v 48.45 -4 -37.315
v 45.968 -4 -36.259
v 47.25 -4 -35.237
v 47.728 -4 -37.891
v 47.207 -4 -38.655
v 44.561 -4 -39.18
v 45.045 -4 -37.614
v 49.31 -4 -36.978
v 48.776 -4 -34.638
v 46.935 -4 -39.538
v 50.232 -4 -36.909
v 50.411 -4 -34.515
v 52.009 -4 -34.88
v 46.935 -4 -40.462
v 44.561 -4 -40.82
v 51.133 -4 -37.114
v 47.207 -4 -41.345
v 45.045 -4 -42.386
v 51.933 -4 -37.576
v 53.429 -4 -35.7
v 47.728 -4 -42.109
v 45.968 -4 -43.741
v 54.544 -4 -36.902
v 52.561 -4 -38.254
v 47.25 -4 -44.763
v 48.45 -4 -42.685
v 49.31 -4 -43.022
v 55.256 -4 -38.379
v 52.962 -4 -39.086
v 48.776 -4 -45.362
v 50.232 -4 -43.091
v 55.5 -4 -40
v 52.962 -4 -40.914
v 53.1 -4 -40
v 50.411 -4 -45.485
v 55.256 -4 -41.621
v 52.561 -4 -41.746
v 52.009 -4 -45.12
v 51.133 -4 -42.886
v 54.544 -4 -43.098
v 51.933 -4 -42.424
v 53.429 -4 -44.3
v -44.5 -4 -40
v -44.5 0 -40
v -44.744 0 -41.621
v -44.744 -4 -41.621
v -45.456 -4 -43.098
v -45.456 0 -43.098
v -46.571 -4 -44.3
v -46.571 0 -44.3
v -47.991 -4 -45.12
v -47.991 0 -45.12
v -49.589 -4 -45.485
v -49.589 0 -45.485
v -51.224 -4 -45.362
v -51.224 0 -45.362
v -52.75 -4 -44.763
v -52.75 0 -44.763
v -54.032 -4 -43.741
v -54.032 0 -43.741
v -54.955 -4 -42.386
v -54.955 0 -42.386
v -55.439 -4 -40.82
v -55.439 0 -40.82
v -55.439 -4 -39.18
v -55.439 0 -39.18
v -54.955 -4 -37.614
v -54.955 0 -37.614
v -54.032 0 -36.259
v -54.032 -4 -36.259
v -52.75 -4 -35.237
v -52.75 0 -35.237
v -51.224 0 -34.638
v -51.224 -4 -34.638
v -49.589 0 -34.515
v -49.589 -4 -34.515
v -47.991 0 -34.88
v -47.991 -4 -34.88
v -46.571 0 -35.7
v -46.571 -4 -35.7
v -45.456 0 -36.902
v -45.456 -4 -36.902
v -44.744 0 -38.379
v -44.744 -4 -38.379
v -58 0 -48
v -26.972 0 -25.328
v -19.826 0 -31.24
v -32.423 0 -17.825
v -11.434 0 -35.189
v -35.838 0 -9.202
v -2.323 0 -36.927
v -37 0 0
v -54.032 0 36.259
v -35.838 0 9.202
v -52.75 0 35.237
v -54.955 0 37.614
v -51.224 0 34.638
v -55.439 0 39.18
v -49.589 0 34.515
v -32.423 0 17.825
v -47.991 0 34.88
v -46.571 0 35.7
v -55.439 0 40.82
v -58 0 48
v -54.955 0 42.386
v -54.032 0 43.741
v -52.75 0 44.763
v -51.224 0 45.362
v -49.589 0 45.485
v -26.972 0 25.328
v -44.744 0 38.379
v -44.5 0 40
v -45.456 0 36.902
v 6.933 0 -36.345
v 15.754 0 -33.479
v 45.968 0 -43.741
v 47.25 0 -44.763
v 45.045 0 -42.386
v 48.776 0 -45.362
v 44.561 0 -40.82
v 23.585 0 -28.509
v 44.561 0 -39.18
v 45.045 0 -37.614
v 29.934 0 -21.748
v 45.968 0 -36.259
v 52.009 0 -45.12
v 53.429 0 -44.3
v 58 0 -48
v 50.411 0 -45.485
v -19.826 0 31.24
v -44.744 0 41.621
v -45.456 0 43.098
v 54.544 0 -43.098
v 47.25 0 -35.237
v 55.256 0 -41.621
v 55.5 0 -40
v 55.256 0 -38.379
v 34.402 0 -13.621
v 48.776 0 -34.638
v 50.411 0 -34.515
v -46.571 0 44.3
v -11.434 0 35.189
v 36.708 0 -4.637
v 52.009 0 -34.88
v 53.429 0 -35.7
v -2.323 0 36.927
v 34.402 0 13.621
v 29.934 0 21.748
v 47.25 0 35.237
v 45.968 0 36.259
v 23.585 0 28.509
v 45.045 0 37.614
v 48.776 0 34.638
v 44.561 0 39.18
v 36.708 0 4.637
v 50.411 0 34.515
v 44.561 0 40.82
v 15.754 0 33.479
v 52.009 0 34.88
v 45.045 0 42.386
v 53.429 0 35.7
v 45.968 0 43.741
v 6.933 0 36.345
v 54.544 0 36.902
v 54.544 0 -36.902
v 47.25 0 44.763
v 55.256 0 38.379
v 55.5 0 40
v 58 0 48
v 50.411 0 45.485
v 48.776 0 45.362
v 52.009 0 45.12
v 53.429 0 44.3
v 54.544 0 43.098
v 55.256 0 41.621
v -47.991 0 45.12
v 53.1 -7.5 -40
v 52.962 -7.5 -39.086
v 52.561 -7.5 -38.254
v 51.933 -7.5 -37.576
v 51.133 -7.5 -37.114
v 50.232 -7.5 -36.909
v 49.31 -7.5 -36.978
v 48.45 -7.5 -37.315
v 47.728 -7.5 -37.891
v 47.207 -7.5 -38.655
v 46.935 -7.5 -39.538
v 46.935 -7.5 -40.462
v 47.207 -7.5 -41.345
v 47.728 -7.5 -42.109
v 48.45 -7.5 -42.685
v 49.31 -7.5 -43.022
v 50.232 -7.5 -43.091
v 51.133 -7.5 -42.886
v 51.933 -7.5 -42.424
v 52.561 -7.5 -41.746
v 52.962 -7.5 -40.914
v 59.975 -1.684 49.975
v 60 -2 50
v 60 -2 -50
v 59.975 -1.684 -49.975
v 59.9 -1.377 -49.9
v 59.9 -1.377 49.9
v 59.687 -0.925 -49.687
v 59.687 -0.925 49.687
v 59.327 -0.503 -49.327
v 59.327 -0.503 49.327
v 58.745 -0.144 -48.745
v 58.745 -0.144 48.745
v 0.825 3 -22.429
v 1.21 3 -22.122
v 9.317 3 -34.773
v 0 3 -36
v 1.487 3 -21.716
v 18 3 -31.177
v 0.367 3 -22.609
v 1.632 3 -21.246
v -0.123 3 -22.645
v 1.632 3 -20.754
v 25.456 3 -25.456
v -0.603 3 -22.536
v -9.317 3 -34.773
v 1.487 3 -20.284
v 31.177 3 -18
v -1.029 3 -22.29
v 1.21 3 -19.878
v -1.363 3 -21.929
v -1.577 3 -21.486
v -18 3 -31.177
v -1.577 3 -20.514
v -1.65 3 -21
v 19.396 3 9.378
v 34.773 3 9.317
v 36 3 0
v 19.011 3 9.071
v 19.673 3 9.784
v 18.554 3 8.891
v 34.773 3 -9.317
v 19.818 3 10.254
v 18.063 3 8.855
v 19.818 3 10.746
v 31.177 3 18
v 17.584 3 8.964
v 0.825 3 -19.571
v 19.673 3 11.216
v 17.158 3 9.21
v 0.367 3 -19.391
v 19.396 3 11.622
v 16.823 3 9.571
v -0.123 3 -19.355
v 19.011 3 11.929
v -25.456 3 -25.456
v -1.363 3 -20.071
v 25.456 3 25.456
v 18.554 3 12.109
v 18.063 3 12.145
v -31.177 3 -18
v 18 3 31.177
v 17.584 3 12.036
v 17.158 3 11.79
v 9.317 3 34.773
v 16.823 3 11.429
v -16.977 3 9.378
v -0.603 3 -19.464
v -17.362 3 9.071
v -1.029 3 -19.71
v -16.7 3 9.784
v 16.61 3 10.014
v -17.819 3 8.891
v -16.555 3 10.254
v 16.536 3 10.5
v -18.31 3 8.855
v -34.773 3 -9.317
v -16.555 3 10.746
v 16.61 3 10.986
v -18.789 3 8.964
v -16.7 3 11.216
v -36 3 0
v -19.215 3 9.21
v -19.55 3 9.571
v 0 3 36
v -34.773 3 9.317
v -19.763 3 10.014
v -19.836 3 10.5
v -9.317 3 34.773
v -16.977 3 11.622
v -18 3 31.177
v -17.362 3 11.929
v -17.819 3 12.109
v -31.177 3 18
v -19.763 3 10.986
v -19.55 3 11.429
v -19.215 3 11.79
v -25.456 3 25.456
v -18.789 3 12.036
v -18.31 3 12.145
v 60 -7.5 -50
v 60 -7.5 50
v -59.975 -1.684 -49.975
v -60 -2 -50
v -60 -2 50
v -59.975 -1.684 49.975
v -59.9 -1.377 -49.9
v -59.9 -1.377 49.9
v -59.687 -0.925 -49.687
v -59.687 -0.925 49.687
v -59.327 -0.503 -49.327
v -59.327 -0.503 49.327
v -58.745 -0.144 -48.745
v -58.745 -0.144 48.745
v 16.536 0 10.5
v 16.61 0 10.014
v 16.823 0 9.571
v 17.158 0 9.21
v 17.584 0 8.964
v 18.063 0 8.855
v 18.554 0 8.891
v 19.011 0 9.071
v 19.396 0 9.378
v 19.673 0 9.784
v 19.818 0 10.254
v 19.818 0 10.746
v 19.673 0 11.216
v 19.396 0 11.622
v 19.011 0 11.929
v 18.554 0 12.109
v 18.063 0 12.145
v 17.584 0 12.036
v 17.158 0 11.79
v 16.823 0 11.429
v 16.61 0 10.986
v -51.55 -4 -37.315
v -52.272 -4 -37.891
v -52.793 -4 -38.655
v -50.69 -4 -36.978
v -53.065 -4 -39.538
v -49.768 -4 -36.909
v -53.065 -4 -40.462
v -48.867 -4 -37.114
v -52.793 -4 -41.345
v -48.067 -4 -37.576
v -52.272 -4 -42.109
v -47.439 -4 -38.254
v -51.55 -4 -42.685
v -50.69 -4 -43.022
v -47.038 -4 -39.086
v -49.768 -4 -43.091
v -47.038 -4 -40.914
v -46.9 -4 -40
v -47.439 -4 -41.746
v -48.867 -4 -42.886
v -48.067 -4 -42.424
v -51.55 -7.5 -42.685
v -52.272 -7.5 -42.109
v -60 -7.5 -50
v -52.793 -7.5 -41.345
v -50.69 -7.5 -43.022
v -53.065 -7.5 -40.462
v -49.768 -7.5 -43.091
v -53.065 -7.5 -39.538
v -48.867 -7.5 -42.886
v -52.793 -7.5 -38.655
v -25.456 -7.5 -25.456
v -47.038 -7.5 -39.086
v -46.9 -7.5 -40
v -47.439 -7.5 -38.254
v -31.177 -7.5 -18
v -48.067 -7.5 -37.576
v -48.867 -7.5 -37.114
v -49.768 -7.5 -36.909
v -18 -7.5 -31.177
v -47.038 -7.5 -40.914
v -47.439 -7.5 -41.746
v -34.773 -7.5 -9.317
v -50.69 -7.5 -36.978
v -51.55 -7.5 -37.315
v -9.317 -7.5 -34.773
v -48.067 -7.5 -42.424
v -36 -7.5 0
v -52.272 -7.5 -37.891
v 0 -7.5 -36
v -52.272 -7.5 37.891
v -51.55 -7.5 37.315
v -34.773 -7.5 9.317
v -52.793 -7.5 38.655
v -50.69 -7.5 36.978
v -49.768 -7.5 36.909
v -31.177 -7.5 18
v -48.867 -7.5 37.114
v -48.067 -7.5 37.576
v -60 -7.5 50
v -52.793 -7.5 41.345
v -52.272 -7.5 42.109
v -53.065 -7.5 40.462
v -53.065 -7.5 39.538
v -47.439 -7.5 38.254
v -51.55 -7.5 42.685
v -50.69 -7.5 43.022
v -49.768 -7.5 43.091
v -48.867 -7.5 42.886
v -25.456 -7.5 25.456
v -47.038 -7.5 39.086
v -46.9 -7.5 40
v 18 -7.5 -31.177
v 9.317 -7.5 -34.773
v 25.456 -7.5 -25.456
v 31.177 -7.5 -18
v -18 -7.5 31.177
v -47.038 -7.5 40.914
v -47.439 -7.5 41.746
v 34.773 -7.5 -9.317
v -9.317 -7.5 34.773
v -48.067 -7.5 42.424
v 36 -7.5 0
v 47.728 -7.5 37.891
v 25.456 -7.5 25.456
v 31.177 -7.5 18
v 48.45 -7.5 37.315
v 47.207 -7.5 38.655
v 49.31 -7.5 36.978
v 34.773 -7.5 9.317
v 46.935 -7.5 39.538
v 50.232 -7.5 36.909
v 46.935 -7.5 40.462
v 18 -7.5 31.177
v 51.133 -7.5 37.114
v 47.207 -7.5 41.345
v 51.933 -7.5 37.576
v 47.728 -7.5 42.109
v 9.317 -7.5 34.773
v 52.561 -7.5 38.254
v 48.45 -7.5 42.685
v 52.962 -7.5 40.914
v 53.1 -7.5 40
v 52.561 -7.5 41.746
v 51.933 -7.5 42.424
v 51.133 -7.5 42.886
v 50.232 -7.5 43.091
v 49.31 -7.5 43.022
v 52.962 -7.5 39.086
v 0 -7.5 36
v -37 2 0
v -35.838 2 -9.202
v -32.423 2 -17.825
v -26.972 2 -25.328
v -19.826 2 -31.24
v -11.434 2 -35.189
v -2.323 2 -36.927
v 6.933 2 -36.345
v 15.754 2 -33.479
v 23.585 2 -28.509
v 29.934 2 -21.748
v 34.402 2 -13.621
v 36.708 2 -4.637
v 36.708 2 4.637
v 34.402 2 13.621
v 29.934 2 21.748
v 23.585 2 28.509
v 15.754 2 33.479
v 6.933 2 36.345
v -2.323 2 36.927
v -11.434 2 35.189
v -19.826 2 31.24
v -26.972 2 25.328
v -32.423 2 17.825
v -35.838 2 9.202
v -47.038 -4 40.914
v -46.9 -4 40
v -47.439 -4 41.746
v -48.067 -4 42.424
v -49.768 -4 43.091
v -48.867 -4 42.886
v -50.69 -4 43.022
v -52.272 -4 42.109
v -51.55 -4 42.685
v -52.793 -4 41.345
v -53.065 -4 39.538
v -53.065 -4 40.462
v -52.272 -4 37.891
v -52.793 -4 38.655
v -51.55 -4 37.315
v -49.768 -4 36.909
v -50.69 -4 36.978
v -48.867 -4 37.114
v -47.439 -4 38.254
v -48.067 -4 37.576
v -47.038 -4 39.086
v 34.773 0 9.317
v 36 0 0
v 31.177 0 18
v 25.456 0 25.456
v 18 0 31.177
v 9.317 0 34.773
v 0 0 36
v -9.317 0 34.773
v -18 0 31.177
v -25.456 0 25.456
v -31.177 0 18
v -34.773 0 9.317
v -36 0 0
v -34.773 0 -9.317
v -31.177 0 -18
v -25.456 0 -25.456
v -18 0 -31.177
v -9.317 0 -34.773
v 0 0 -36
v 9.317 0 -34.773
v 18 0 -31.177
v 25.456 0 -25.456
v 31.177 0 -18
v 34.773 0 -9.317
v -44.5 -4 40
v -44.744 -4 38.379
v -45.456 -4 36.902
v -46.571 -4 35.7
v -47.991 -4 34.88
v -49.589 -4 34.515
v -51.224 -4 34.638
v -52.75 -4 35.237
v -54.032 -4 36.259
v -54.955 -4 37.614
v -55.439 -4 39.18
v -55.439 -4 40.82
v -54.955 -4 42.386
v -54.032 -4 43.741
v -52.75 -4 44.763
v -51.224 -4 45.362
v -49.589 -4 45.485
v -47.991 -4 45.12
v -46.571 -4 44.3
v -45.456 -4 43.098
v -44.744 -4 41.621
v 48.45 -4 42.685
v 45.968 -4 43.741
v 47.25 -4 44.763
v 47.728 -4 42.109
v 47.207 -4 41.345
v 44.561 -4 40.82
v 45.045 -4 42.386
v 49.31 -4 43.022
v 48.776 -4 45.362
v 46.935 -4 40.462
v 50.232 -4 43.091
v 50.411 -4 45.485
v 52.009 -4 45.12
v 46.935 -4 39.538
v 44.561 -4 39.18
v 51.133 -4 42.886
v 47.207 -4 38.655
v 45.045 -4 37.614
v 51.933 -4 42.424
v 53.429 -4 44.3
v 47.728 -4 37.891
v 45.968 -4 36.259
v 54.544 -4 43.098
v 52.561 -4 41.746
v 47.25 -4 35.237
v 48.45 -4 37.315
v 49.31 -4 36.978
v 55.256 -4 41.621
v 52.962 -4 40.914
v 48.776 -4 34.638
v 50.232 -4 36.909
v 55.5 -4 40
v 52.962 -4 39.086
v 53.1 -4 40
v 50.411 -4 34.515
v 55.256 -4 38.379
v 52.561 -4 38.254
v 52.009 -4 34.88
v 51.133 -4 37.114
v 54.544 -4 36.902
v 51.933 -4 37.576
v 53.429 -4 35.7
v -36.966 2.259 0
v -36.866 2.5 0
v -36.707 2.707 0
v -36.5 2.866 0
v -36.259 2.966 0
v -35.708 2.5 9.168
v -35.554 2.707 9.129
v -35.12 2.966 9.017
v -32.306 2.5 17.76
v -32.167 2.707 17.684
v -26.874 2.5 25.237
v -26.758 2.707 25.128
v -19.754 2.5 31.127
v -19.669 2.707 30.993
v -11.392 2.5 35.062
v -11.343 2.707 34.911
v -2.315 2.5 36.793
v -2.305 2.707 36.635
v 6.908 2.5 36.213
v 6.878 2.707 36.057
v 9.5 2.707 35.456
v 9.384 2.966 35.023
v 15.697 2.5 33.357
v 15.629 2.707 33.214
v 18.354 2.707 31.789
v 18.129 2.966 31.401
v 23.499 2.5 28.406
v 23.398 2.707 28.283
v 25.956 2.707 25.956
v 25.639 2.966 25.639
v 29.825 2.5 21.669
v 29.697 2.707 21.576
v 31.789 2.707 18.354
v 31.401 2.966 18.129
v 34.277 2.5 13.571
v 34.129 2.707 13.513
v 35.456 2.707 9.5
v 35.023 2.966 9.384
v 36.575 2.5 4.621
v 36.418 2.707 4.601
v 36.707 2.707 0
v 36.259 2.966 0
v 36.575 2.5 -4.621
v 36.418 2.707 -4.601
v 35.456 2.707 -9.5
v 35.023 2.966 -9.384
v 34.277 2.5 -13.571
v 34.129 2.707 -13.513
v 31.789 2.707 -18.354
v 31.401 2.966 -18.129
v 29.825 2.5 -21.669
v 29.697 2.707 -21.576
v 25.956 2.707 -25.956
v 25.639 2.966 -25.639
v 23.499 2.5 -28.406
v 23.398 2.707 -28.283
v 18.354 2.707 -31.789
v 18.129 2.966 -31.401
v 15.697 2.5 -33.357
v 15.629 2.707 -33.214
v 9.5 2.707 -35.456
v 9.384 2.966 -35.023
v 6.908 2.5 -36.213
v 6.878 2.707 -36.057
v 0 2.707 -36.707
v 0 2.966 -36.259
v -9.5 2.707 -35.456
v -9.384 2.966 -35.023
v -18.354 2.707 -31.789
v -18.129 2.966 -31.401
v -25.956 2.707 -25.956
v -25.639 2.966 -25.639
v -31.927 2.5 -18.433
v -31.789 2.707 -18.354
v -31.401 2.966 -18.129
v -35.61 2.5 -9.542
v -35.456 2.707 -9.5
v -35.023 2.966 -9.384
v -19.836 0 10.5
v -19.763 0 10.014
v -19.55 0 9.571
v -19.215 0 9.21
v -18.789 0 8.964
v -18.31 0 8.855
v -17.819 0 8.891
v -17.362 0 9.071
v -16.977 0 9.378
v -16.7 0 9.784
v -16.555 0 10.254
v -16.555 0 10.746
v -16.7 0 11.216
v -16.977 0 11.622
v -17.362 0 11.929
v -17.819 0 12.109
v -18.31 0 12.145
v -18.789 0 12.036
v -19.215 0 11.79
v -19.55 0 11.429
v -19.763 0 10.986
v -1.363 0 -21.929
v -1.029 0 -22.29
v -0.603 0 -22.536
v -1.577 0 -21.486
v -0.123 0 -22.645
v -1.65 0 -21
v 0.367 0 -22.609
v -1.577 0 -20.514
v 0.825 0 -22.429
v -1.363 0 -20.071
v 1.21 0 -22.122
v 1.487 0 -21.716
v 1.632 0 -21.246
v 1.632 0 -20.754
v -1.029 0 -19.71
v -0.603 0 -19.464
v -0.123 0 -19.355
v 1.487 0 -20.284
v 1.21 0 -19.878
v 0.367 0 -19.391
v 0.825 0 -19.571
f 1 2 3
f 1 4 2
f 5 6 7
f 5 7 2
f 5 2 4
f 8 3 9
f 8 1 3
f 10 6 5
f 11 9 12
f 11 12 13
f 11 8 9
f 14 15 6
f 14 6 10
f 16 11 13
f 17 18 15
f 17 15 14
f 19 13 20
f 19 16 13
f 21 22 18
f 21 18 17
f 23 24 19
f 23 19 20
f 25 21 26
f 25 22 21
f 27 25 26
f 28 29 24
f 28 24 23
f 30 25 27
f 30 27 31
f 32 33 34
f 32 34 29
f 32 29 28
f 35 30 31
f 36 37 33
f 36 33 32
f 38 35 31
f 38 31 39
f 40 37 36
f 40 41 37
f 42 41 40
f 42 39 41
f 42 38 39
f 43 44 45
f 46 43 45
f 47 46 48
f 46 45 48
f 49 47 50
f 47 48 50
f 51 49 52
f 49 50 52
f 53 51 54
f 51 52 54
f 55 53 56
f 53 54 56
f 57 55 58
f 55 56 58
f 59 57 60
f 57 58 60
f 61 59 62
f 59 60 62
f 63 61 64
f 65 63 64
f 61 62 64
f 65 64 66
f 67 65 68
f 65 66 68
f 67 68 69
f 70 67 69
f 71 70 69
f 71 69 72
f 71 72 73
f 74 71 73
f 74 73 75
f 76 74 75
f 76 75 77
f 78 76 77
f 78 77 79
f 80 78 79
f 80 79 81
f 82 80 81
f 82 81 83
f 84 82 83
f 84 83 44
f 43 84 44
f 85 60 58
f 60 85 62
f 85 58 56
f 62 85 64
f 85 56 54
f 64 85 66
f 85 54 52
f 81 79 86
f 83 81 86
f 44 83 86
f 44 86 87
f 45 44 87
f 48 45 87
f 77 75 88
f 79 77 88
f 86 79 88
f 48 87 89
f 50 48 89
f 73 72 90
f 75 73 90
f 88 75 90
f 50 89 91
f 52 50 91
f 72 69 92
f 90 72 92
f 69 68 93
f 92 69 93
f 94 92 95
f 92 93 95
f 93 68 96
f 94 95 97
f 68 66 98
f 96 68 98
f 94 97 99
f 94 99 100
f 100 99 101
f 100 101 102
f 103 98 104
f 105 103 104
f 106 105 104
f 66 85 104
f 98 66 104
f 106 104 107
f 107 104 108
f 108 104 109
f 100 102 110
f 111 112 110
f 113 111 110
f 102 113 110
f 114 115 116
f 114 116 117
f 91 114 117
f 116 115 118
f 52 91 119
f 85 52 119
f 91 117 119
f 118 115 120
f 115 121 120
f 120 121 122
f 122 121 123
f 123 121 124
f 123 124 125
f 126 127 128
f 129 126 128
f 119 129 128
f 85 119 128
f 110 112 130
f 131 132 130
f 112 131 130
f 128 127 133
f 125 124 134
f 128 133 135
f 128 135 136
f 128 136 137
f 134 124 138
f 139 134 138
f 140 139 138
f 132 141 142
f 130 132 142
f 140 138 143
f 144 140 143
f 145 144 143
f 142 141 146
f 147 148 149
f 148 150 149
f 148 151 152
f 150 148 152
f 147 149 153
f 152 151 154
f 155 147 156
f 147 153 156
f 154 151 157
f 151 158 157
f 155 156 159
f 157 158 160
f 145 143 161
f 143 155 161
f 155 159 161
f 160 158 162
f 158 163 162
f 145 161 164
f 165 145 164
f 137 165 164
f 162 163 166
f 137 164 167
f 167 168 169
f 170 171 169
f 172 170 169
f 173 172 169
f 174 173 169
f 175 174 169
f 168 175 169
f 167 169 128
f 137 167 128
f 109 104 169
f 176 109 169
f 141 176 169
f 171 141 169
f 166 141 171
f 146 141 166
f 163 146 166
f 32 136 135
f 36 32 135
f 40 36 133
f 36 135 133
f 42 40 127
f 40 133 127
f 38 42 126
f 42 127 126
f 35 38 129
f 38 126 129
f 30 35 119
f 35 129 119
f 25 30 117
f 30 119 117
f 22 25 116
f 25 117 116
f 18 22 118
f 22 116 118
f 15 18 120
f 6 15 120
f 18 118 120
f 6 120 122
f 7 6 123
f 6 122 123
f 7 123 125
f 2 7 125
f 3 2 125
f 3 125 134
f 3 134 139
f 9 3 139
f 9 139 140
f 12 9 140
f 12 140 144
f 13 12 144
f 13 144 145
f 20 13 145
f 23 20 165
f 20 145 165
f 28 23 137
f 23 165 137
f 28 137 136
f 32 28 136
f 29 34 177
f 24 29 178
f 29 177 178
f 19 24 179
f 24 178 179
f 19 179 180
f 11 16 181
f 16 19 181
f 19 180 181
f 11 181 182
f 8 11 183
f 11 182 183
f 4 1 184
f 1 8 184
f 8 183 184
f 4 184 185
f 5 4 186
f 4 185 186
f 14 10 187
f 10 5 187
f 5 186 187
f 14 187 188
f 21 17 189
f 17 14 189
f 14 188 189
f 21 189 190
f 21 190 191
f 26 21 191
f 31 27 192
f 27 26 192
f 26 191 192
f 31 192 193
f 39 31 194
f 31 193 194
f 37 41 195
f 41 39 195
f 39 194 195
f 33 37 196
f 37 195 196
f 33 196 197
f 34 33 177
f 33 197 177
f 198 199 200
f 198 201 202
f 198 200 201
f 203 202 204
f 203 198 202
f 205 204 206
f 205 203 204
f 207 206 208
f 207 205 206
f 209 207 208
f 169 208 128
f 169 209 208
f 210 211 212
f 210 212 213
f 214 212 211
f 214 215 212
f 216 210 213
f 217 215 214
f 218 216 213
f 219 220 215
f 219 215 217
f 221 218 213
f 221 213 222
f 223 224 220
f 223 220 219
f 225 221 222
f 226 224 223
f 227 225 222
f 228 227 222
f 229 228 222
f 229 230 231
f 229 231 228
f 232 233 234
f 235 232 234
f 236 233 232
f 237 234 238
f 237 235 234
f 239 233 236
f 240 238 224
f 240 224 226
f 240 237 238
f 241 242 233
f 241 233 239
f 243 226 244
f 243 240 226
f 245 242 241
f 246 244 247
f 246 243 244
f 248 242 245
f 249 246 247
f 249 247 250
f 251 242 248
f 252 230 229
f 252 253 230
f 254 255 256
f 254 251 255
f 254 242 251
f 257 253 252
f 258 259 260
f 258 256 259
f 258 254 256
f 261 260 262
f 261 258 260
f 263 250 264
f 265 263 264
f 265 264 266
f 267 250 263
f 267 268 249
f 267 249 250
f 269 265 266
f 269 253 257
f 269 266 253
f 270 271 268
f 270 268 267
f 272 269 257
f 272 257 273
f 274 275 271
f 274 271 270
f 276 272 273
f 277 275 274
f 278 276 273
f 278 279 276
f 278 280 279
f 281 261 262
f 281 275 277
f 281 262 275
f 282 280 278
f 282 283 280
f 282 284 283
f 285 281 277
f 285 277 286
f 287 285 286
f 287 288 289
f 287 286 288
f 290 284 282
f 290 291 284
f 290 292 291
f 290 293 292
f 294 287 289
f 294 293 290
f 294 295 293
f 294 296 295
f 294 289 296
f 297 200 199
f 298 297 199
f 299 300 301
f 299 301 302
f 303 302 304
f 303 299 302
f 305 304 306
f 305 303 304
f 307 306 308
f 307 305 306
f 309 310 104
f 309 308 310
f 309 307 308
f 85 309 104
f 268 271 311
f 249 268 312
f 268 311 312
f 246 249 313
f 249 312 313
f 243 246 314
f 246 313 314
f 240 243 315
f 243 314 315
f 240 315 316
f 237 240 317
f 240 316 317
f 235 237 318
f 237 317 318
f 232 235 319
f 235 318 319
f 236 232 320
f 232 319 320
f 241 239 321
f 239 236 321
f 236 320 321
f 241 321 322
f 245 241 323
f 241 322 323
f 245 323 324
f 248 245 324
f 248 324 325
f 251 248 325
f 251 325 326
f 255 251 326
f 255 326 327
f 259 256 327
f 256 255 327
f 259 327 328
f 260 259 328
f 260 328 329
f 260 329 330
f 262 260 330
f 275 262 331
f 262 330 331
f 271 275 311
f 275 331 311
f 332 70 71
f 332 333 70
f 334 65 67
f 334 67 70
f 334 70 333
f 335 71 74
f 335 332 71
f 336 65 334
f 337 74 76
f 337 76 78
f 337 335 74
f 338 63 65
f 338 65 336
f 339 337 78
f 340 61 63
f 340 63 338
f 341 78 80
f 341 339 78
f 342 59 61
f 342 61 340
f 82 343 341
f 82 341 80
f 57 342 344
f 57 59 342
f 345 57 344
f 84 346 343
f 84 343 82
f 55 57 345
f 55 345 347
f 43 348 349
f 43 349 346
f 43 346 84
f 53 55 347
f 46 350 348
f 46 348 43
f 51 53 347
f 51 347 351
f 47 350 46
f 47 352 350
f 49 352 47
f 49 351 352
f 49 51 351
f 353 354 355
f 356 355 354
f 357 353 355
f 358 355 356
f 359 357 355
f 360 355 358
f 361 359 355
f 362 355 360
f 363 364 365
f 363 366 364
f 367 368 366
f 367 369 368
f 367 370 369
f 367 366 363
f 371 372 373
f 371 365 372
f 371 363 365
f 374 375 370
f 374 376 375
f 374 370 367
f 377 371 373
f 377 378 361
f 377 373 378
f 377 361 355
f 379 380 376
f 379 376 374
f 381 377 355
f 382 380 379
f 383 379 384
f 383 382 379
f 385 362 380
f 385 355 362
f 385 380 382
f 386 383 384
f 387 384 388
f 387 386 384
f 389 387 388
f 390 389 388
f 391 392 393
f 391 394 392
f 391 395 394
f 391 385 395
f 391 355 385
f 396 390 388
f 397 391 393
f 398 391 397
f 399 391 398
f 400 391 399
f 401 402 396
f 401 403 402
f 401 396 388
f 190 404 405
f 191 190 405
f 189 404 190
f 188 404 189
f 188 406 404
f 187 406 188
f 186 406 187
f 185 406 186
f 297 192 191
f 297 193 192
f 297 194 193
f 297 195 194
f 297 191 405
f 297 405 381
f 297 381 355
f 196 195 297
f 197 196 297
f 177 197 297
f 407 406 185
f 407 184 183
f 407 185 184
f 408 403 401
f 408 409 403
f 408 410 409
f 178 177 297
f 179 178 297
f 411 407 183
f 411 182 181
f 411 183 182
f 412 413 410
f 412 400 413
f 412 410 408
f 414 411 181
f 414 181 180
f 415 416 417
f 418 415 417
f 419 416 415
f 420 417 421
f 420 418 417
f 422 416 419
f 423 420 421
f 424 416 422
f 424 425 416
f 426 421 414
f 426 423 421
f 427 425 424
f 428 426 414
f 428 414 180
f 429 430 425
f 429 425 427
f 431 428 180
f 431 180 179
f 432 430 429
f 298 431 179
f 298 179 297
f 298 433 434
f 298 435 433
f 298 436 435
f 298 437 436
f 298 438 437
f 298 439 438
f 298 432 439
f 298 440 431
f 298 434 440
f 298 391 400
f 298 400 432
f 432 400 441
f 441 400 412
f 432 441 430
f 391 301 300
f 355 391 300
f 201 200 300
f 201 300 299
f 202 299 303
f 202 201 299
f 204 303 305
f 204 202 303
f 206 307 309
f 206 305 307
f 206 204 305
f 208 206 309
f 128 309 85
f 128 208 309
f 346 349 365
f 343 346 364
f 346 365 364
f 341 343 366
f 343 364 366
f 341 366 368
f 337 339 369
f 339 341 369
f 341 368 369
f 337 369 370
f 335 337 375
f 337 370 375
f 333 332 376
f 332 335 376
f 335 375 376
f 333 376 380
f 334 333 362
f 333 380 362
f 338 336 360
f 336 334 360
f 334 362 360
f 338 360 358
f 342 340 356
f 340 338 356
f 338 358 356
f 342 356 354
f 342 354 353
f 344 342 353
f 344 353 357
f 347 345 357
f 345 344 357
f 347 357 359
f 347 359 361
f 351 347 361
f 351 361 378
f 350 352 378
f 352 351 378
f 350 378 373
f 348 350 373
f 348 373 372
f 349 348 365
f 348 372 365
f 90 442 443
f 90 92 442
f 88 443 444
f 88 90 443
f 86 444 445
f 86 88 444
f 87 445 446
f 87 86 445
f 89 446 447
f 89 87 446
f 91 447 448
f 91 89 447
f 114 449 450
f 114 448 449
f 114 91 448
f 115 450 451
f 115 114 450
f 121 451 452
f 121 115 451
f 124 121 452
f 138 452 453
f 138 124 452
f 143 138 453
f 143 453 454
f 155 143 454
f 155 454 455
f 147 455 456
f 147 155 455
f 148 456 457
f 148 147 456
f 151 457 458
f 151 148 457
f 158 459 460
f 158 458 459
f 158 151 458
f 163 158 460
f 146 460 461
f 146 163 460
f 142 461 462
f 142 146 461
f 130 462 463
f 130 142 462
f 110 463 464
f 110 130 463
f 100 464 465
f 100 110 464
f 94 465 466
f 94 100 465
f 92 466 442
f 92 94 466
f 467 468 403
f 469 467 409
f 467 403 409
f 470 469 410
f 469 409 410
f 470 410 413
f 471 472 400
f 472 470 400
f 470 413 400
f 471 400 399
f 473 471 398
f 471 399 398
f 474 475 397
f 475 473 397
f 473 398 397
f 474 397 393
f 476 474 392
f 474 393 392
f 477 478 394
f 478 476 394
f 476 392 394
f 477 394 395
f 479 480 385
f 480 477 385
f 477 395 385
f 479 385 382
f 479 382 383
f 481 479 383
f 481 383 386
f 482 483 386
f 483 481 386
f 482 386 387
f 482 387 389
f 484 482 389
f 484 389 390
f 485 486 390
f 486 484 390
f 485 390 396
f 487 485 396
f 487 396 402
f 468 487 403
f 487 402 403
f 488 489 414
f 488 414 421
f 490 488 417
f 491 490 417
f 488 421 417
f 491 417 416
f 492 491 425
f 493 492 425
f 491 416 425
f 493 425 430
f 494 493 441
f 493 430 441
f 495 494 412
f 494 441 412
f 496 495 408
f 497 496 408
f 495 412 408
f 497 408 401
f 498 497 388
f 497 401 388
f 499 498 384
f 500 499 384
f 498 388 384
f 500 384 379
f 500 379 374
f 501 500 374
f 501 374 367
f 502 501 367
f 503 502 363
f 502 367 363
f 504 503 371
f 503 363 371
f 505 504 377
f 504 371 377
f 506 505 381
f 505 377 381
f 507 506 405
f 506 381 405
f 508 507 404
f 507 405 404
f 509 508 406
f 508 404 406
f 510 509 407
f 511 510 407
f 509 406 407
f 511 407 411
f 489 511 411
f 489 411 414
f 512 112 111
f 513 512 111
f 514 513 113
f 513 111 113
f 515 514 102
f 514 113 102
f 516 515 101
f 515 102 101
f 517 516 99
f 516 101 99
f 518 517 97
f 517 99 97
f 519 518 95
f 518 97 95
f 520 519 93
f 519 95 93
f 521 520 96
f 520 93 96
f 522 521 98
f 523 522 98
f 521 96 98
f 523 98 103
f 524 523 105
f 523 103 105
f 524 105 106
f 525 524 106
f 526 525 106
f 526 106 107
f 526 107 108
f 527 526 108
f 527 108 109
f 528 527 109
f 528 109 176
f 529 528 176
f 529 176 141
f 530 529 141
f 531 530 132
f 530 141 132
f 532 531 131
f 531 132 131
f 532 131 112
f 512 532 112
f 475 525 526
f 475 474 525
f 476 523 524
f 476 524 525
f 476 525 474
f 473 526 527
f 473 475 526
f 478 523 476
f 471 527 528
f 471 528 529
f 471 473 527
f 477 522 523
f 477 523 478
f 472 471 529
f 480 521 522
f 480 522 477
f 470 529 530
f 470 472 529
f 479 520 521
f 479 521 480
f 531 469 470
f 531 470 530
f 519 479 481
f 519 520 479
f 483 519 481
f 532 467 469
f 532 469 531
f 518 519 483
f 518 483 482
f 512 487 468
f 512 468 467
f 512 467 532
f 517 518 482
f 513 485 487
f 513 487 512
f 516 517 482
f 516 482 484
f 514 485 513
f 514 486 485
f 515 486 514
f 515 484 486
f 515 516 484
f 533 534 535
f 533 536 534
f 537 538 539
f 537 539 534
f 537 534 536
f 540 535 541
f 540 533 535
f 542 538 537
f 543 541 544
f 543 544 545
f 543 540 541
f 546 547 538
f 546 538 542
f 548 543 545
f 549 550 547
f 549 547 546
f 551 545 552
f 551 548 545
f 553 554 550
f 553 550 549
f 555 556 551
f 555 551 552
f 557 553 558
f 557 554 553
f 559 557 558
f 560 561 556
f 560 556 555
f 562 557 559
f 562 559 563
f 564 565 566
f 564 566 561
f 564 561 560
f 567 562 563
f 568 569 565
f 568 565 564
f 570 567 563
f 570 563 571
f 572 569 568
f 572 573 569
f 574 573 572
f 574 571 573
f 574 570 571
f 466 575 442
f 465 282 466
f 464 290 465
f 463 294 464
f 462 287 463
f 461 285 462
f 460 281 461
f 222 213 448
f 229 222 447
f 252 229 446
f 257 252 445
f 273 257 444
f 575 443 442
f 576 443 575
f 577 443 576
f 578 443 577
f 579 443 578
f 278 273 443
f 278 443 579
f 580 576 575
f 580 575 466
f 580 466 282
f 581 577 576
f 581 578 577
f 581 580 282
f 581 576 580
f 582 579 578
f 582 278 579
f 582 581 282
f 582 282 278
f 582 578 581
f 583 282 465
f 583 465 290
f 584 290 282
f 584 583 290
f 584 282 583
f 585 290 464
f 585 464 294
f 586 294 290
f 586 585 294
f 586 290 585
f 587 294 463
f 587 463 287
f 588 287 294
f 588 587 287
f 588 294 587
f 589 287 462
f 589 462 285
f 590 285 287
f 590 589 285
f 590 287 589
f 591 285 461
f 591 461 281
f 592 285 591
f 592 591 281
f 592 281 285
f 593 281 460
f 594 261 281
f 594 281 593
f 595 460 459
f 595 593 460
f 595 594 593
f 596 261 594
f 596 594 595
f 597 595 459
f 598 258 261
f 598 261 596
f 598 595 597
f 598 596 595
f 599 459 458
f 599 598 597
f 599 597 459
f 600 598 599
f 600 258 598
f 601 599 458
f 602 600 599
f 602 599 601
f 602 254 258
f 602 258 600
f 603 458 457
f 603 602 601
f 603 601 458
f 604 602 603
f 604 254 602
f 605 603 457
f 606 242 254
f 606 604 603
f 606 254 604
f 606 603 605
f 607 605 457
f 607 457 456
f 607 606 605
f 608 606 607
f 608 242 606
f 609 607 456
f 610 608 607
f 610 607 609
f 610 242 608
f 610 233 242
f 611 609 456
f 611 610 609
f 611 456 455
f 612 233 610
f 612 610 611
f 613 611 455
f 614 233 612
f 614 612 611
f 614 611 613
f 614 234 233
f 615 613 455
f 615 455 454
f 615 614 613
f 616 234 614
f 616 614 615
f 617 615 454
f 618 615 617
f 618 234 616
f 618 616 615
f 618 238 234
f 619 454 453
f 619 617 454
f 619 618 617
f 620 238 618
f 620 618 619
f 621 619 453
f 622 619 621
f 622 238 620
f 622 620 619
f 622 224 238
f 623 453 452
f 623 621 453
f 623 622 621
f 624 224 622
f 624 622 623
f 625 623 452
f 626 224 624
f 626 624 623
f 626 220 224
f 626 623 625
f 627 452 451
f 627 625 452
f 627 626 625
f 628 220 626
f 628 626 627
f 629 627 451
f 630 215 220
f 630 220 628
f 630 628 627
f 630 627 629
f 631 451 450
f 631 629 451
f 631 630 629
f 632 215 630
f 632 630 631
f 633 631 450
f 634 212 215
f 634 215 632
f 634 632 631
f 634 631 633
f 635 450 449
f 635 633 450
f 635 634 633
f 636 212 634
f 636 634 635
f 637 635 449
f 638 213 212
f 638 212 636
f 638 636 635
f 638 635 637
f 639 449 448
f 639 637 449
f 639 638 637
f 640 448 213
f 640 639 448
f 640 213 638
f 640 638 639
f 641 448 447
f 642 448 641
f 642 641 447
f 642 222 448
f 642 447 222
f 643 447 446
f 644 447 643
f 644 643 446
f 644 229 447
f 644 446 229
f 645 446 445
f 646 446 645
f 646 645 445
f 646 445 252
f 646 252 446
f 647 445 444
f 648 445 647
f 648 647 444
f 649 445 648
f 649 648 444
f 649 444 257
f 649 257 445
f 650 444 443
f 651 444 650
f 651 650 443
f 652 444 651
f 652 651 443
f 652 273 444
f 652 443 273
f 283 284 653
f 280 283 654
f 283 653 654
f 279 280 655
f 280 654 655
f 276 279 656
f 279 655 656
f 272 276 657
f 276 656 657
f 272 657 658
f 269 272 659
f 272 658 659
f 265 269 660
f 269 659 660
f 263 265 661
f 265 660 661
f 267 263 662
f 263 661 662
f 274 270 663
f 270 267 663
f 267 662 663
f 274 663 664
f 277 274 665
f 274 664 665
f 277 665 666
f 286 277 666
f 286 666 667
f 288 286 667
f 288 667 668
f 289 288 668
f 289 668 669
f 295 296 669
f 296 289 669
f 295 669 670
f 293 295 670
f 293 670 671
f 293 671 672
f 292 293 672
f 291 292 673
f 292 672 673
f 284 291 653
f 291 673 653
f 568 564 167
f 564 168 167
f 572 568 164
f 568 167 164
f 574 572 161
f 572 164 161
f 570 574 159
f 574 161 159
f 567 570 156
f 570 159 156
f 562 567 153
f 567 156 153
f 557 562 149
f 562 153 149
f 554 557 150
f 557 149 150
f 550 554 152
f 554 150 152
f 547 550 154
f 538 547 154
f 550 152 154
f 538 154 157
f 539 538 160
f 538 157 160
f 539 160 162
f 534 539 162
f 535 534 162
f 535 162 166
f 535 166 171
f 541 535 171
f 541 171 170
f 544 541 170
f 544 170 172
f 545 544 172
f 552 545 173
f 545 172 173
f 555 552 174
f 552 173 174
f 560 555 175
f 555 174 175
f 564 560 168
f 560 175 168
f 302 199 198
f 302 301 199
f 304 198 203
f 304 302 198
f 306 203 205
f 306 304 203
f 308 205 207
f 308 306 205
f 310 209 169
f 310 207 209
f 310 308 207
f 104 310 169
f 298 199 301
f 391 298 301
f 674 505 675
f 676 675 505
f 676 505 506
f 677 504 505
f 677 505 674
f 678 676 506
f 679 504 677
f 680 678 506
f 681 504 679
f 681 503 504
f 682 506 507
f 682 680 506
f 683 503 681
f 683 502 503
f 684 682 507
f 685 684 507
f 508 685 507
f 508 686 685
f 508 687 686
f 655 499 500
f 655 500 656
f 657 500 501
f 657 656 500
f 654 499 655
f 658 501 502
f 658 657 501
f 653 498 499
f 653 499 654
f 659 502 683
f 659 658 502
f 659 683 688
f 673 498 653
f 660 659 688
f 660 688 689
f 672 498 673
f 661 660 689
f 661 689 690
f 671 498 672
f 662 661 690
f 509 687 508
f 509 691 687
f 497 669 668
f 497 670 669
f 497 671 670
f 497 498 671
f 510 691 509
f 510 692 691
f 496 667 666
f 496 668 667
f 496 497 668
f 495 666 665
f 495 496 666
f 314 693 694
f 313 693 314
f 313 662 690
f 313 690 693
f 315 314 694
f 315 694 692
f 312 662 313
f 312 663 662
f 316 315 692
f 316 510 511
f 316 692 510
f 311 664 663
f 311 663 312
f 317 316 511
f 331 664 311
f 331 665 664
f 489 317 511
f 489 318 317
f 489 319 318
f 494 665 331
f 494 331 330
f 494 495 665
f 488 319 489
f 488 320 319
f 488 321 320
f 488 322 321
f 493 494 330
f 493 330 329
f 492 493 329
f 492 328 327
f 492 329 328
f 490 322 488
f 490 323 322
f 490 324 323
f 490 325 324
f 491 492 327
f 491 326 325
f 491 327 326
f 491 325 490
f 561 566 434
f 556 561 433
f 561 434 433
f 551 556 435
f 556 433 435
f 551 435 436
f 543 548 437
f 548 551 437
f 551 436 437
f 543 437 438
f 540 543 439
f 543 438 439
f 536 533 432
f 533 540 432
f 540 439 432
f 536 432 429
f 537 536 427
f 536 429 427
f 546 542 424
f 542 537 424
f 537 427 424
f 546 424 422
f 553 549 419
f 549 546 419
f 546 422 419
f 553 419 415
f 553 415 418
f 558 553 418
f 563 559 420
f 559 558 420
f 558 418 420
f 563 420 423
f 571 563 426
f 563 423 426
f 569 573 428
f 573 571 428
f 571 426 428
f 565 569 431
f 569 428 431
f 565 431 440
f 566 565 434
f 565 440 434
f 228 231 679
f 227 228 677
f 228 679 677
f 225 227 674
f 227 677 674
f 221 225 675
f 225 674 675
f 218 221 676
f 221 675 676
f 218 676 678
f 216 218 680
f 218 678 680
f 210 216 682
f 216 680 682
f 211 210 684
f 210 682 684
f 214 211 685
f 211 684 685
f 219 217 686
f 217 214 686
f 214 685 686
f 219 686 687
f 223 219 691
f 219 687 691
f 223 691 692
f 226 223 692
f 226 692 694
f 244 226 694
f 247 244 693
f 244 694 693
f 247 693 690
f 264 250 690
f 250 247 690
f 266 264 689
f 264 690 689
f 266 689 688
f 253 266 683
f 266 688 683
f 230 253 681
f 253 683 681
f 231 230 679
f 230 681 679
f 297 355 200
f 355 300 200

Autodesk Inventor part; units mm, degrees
ref_plane "YZ Plane" through (0, 0, 0) normal (1, 0, 0) x (0, 1, 0)
ref_plane "XZ Plane" through (0, 0, 0) normal (0, 1, 0) x (-1, 0, 0)
ref_plane "XY Plane" through (0, 0, 0) normal (0, 0, 1) x (1, 0, 0)
sketch "스케치1" plane through (0, 0, 0) normal (0, 1, 0) x (-1, 0, 0)
  circle A0 centre (0, 0) radius 37
  circle A1 centre (0, 0) radius 21 construction
  circle A2 centre (0, -21) radius 1.65
  circle A3 centre (18.1865, 10.5) radius 1.65
  circle A4 centre (-18.1865, 10.5) radius 1.65
  dimension "d1" = 42
  dimension "d0" = 74
  dimension "d2" = 3.3
  dimension "d6" = 360
extrude "돌출1" add sketch "스케치1" along normal blind 3
sketch "스케치2" plane through (0, 0, 0) normal (0, -1, 0) x (1, 0, 0)
  line L0 (60, 50) -> (-60, 50)
  line L1 (-60, 50) -> (-60, -50)
  line L2 (-60, -50) -> (60, -50)
  line L3 (60, -50) -> (60, 50)
  line L4 (60, 50) -> (-60, -50) construction
  line L5 (-60, 50) -> (60, -50) construction
  circle A0 centre (0, 0) radius 37 projected
  circle A1 centre (18.1865, 10.5) radius 1.65 projected
  circle A2 centre (-18.1865, 10.5) radius 1.65 projected
  circle A3 centre (0, -21) radius 1.65 projected
  dimension "d10" = 120
  dimension "d11" = 100
extrude "돌출2" add sketch "스케치2" along normal blind 7.5 contours L3 L2 L1 L0 | A0
fillet "모깎기1" radius 2 4 edges at (60, 0, 0) (0, 0, -50) (-60, 0, 0) (0, 0, 50)
fillet "모깎기1" radius 1 1 edges at (37, 3, 0)
sketch "스케치5" plane through (0, -7.5, 0) normal (0, -1, 0) x (1, 0, 0)
  circle A0 centre (0, 0) radius 36 projected
extrude "돌출3" cut sketch "스케치5" against normal blind 7.5
sketch "스케치6" plane through (0, -7.5, 0) normal (0, -1, 0) x (1, 0, 0)
  circle A0 centre (-50, -40) radius 3.1
  line L0 (-60, -50) -> (60, -50) projected
  line L1 (-60, 50) -> (-60, -50) projected
  circle A1 centre (50, -40) radius 3.1
  circle A2 centre (-50, 40) radius 3.1
  circle A3 centre (50, 40) radius 3.1
  point P0 (0, 0)
  dimension "d18" = 6.2
  dimension "d19" = 10
  dimension "d20" = 10
  dimension "d21" = 120
  dimension "d22" = 100
  dimension "d25" = 100
  dimension "d32" = 80
extrude "돌출4" cut sketch "스케치6" against normal through all
sketch "스케치7" plane through (0, 0, 0) normal (0, 1, 0) x (1, 0, 0)
  circle A0 centre (-50, 40) radius 3.1 projected
  circle A1 centre (50, 40) radius 3.1 projected
  circle A2 centre (-50, -40) radius 3.1 projected
  circle A3 centre (50, -40) radius 3.1 projected
  circle A4 centre (0, 0) radius 37 projected
  line L0 (-58, -48) -> (-58, 48) projected
  line L1 (58, -48) -> (-58, -48) projected
  line L2 (58, 48) -> (58, -48) projected
  line L3 (-58, 48) -> (58, 48) projected
  circle A5 centre (50, -40) radius 5.5
  circle A6 centre (-50, -40) radius 5.5
  circle A7 centre (-50, 40) radius 5.5
  circle A8 centre (50, 40) radius 5.5
  dimension "d39" = 11
  dimension "d40" = 11
  dimension "d41" = 11
  dimension "d42" = 11
extrude "돌출5" cut sketch "스케치7" against normal blind 4 contours A5 | A6 | A7 | A8
properties part number "LiDAR_holder_upper" material "ABS Plastic"
